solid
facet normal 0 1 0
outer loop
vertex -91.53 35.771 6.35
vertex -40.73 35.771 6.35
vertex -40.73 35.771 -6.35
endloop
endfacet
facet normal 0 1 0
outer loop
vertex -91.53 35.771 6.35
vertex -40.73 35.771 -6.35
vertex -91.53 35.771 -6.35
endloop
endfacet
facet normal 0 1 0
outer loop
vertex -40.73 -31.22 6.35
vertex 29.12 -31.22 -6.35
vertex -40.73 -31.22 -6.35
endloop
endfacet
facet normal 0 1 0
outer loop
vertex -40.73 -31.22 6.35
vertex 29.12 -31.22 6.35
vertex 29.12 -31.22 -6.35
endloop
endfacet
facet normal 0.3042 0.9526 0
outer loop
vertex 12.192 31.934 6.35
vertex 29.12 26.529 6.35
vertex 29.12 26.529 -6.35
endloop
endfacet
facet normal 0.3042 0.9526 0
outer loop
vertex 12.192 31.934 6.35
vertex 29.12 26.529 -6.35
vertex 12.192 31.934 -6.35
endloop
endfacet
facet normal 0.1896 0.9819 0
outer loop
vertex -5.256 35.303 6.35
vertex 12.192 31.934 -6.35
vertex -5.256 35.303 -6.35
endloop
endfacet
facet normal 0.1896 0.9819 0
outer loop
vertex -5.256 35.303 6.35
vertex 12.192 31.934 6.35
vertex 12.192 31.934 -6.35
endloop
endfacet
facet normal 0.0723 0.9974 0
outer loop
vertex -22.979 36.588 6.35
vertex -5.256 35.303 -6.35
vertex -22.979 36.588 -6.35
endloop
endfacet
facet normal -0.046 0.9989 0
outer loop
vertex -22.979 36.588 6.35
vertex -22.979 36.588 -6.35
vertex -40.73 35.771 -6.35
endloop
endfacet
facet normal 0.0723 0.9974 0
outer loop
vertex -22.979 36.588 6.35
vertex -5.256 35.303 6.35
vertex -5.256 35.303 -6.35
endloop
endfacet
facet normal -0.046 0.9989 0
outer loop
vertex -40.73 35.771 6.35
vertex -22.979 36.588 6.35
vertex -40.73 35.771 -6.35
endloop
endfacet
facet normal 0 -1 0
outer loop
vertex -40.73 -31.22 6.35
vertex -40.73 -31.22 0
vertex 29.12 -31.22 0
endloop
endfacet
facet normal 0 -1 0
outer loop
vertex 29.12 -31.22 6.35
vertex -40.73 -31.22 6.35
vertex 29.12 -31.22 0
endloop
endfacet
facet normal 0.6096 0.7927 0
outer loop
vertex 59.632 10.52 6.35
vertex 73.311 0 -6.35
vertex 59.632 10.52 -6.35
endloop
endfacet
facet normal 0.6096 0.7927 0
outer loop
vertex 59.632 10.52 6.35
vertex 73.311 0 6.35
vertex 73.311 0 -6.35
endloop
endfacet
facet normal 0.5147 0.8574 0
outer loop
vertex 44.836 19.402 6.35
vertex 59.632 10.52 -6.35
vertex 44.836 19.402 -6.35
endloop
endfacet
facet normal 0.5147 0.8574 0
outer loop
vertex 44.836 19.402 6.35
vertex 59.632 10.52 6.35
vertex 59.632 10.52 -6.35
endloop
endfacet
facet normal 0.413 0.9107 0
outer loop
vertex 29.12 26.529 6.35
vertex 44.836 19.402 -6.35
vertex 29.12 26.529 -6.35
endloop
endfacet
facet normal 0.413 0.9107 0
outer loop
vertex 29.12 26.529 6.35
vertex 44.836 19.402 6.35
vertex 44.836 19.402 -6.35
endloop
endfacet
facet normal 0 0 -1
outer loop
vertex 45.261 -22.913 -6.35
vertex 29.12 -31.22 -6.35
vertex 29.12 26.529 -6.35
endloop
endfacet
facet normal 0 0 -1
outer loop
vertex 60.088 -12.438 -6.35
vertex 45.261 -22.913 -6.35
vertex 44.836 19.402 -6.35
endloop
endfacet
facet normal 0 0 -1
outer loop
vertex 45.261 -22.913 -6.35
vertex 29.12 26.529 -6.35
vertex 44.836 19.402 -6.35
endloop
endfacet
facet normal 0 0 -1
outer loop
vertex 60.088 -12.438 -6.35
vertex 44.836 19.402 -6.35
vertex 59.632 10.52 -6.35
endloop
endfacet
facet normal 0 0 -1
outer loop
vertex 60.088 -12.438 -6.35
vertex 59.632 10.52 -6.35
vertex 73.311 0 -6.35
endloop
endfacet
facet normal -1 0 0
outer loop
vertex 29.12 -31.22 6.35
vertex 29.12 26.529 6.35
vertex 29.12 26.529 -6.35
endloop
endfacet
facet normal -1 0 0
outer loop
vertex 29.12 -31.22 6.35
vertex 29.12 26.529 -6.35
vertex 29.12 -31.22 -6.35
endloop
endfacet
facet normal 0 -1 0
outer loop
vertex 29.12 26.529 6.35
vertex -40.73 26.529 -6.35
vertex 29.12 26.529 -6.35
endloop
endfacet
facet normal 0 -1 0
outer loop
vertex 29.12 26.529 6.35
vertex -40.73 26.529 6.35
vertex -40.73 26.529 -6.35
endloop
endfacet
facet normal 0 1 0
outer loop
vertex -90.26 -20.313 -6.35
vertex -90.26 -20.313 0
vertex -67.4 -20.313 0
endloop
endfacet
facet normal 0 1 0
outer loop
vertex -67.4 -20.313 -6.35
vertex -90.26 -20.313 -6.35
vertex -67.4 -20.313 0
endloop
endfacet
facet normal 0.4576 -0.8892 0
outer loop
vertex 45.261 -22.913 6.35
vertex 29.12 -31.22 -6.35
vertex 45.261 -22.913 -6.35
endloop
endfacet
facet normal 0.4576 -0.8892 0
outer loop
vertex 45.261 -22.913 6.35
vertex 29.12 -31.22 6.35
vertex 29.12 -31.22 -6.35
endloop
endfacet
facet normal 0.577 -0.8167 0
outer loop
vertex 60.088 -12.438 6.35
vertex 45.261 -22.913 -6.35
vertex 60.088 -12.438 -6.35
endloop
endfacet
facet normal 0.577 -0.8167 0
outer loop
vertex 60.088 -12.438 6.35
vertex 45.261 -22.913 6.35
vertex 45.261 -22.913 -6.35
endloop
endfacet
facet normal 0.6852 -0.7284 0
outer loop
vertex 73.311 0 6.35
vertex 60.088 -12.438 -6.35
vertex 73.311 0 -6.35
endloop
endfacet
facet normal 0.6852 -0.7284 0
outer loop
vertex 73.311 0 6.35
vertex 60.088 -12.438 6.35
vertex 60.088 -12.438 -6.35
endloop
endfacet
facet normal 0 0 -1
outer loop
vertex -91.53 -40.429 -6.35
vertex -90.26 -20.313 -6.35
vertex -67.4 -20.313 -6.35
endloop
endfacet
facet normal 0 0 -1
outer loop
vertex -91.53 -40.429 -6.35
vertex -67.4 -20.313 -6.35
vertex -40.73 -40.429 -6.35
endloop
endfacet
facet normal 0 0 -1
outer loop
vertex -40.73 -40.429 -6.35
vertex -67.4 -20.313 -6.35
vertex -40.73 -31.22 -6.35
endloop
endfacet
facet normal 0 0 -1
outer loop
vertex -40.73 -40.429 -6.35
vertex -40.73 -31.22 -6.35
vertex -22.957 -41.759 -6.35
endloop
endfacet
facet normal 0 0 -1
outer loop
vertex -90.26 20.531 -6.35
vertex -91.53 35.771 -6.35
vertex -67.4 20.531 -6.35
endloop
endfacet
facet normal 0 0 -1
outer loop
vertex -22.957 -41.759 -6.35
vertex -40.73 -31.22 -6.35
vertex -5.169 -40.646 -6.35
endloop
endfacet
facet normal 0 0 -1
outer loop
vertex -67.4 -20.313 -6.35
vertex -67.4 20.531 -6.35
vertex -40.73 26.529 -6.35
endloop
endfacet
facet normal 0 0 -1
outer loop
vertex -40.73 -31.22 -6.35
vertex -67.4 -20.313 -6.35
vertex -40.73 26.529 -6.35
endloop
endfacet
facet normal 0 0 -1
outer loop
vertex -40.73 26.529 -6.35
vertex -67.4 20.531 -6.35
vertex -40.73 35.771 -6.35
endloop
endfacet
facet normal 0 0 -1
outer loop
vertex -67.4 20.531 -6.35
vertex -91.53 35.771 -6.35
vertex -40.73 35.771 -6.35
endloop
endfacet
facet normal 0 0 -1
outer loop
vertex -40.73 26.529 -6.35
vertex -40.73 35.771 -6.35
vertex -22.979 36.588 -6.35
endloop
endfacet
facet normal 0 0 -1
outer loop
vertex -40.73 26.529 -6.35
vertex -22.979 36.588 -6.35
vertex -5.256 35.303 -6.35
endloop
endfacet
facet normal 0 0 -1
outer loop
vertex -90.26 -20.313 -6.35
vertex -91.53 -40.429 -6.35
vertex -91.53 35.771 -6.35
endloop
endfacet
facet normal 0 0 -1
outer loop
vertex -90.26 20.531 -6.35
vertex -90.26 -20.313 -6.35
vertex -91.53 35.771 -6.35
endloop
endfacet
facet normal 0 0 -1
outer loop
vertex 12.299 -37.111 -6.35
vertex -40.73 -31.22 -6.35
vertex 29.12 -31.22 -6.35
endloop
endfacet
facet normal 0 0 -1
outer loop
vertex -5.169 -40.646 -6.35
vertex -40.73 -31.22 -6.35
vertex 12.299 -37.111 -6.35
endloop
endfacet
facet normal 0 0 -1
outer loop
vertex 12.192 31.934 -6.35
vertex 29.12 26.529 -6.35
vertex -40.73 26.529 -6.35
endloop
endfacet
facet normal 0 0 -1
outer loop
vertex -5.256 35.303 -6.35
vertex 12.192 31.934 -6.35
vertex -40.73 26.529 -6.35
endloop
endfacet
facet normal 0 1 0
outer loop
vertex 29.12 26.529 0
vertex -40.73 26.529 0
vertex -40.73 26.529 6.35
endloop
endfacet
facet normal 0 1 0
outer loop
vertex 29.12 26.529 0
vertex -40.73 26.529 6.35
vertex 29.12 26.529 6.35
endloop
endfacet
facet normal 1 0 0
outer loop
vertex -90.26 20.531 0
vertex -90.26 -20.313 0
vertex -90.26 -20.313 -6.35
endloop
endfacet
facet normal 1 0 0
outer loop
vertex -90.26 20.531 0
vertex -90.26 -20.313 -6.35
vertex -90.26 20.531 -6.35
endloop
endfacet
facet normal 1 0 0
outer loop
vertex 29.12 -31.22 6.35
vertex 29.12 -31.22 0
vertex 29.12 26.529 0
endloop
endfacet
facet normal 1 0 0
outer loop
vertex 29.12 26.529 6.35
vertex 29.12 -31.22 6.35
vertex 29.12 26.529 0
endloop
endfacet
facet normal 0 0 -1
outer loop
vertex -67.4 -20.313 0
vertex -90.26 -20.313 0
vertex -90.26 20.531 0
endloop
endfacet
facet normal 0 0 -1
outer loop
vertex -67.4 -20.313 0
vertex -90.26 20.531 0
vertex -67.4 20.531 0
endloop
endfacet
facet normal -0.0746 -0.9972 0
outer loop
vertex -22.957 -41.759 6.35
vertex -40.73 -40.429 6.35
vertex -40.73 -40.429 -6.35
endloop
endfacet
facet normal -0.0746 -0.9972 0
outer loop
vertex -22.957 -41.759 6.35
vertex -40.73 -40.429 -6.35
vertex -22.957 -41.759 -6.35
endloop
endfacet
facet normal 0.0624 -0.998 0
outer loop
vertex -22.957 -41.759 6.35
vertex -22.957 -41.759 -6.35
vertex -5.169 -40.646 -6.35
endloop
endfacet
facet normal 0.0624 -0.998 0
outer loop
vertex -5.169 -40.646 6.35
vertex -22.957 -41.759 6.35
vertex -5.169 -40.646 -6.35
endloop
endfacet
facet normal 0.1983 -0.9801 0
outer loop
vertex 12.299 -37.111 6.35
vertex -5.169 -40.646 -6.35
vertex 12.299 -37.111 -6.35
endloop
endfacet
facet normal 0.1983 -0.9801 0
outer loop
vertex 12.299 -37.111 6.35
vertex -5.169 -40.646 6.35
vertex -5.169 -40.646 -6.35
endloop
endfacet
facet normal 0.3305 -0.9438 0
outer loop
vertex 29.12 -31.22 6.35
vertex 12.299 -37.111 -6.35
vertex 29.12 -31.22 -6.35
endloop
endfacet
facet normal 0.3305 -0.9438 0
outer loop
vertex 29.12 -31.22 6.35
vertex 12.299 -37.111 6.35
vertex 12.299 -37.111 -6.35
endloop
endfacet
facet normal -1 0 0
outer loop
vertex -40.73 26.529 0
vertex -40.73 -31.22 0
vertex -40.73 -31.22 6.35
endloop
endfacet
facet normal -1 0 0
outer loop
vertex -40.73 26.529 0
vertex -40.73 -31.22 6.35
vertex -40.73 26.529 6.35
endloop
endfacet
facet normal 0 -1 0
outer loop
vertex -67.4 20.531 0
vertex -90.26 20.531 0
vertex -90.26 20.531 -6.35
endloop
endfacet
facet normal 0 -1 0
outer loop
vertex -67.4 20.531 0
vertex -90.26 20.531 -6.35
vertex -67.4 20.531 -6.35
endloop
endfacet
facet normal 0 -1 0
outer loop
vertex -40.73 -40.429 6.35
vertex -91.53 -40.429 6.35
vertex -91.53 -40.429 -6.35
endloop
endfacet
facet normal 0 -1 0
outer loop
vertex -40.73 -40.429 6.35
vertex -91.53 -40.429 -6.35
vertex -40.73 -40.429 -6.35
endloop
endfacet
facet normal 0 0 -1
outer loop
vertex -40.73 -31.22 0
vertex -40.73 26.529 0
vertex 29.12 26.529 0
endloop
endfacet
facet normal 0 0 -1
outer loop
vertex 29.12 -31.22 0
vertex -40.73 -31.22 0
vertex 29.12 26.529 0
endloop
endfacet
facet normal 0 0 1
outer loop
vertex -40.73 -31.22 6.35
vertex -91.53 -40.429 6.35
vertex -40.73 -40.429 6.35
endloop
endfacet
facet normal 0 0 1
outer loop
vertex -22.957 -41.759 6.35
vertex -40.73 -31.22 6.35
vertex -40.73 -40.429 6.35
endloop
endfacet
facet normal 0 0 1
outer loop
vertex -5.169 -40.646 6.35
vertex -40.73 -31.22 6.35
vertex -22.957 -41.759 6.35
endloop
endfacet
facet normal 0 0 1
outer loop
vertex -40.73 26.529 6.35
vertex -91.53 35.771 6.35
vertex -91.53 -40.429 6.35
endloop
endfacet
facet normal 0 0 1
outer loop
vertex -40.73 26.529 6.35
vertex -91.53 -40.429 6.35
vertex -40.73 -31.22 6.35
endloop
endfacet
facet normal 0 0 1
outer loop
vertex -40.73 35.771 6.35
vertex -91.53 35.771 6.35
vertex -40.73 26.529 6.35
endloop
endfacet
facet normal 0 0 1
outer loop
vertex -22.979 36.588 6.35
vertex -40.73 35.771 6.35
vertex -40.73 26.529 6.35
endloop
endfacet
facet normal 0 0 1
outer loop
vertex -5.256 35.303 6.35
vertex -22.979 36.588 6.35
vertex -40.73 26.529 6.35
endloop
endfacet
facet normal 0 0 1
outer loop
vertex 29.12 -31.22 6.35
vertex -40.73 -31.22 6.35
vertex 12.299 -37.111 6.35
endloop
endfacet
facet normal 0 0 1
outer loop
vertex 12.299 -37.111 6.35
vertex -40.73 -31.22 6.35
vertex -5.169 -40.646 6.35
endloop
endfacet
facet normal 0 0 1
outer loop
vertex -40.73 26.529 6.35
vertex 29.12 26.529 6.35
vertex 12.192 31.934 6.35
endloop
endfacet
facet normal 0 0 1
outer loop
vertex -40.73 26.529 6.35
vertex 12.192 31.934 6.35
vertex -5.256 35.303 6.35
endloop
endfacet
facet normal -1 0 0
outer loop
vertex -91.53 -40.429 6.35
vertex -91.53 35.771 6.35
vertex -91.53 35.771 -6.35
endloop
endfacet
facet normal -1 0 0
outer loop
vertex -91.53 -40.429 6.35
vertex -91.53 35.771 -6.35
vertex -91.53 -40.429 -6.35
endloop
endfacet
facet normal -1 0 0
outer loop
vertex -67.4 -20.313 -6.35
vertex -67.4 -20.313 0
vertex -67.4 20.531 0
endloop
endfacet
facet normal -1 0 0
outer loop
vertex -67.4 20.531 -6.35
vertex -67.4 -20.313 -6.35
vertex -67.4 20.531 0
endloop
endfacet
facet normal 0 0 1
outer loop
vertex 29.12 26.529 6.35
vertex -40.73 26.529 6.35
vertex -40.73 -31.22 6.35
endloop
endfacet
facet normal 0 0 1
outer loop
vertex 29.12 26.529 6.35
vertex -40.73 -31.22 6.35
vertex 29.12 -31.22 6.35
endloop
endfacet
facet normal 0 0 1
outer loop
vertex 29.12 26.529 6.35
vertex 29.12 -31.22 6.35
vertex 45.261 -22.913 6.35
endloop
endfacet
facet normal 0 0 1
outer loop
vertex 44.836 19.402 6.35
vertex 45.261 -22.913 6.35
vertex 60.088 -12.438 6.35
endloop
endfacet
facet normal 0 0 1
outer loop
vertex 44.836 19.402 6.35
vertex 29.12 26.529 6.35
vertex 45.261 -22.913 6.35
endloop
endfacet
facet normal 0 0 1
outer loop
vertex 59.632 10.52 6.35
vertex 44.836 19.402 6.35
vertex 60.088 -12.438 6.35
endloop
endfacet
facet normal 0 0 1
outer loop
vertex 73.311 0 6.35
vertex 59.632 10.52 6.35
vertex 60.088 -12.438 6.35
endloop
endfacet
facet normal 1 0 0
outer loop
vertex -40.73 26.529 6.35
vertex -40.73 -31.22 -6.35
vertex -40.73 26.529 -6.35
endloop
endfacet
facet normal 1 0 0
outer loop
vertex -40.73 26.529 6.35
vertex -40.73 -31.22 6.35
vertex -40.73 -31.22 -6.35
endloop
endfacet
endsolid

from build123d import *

# Parameters (mm, degrees)
F0_W     = 22.86
F0_H     = 40.843565
F1_DEPTH = 6.35
F2_DEPTH = 6.35
F0_W_2   = 69.85
F0_H_2   = 57.749105
F3_DEPTH = 6.35


with BuildPart() as f1:
    # F0 (on Top) → F1 (new body, symmetric)
    with BuildSketch(Plane.XY):
        Polygon((-40.730062, 35.770836), (-91.530062, 35.770836), (-91.530062, -40.429164), (-40.730062, -40.429164), (-40.730062, -31.220334), (-40.730062, 26.528771), align=None)
        with Locations((-78.830062, 0.109054)):
            Rectangle(F0_W, F0_H, mode=Mode.SUBTRACT)
        with BuildLine():
            ThreePointArc((29.119938, 26.528771), (-5.255576, 35.302732), (-40.730062, 35.770836))
            Line((-40.730062, 35.770836), (-40.730062, 26.528771))
            Line((-40.730062, 26.528771), (29.119938, 26.528771))
        make_face()
        with BuildLine():
            ThreePointArc((73.310904, 0), (52.361641, 15.173729), (29.119938, 26.528771))
            Line((29.119938, 26.528771), (29.119938, -31.220334))
            ThreePointArc((29.119938, -31.220334), (52.857458, -17.934396), (73.310904, 0))
        make_face()
        with BuildLine():
            Line((-40.730062, -31.220334), (-40.730062, -40.429164))
            ThreePointArc((-40.730062, -40.429164), (-5.1694, -40.646315), (29.119938, -31.220334))
            Line((29.119938, -31.220334), (-40.730062, -31.220334))
        make_face()
    extrude(amount=F1_DEPTH, both=True)

    # F0 (on Top) → F2 (join)
    with BuildSketch(Plane.XY):
        with Locations((-78.830062, 0.109054)):
            Rectangle(F0_W, F0_H)
    extrude(amount=F2_DEPTH)


with BuildPart() as f3:
    # F0 (on Top) → F3 (new body)
    with BuildSketch(Plane.XY):
        with Locations((-5.805062, -2.345781)):
            Rectangle(F0_W_2, F0_H_2)
    extrude(amount=F3_DEPTH)


solid = Compound([f1.part, f3.part])
